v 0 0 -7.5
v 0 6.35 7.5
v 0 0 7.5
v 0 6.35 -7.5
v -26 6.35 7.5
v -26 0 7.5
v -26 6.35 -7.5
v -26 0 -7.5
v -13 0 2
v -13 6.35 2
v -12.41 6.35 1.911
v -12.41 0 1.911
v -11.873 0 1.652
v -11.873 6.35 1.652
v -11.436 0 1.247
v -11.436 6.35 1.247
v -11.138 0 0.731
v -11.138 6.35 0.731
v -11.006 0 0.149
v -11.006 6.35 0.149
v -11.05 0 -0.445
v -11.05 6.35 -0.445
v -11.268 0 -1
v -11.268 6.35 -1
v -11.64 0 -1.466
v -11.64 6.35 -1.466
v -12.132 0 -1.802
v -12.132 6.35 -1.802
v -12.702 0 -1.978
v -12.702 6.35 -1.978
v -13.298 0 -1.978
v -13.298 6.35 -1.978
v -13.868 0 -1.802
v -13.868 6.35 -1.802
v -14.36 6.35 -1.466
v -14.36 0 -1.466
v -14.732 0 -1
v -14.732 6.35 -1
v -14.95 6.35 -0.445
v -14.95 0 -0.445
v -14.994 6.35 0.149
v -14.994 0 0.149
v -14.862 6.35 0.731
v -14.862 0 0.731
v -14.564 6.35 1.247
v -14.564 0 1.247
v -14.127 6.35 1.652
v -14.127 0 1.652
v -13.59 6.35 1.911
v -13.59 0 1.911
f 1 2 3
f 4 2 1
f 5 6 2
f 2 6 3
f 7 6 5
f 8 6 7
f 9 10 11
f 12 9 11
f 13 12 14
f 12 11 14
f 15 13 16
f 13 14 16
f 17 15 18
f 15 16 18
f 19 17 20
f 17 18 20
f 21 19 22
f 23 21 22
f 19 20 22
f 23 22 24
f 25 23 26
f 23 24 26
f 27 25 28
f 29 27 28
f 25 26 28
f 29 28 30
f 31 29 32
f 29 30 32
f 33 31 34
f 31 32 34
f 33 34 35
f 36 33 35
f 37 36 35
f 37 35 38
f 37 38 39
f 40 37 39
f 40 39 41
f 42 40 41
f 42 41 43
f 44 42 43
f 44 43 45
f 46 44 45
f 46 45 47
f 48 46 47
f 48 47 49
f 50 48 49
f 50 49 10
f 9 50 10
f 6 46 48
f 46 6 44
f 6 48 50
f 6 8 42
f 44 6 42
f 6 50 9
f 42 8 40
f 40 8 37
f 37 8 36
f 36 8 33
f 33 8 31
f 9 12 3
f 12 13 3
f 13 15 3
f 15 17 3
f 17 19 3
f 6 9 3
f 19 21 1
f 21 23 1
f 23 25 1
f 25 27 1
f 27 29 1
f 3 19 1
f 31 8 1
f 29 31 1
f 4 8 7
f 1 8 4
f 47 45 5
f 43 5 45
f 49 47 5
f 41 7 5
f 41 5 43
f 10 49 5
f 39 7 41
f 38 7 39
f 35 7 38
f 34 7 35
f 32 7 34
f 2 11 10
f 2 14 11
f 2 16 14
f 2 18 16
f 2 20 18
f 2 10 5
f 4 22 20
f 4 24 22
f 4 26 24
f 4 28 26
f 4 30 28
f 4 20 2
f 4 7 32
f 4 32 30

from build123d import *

# Parameters (mm, degrees)
SKETCH1_W           = 52
SKETCH1_H           = 15
BOSS_EXTRUDE1_DEPTH = 6.35
SKETCH3_R           = 2
CUT_EXTRUDE2_DEPTH  = 28.795188433
SKETCH2_W           = 26
SKETCH2_H           = 15
CUT_EXTRUDE1_DEPTH  = 28.795188433


with BuildPart() as part:
    # Sketch1 → Boss-Extrude1 (new body)
    with BuildSketch(Plane(origin=(0, 0, 0), x_dir=(1, 0, 0), z_dir=(0, 1, 0))):
        Rectangle(SKETCH1_W, SKETCH1_H)
    extrude(amount=BOSS_EXTRUDE1_DEPTH)

    # Sketch3 → Cut-Extrude2 (cut, through all)
    with BuildSketch(Plane(origin=(0, 6.35, 0), x_dir=(1, 0, 0), z_dir=(0, 1, 0))):
        with Locations(Location((-13, 0, 0), (0, 0, 270))):
            Circle(SKETCH3_R)
        with Locations(Location((13, 0, 0), (0, 0, 270))):
            Circle(SKETCH3_R)
    extrude(amount=-CUT_EXTRUDE2_DEPTH, mode=Mode.SUBTRACT)

    # Sketch2 → Cut-Extrude1 (cut, through all)
    with BuildSketch(Plane(origin=(0, 6.35, 0), x_dir=(1, 0, 0), z_dir=(0, 1, 0))):
        with Locations((13, 0)):
            Rectangle(SKETCH2_W, SKETCH2_H)
    extrude(amount=-CUT_EXTRUDE1_DEPTH, mode=Mode.SUBTRACT)


solid = part.part
